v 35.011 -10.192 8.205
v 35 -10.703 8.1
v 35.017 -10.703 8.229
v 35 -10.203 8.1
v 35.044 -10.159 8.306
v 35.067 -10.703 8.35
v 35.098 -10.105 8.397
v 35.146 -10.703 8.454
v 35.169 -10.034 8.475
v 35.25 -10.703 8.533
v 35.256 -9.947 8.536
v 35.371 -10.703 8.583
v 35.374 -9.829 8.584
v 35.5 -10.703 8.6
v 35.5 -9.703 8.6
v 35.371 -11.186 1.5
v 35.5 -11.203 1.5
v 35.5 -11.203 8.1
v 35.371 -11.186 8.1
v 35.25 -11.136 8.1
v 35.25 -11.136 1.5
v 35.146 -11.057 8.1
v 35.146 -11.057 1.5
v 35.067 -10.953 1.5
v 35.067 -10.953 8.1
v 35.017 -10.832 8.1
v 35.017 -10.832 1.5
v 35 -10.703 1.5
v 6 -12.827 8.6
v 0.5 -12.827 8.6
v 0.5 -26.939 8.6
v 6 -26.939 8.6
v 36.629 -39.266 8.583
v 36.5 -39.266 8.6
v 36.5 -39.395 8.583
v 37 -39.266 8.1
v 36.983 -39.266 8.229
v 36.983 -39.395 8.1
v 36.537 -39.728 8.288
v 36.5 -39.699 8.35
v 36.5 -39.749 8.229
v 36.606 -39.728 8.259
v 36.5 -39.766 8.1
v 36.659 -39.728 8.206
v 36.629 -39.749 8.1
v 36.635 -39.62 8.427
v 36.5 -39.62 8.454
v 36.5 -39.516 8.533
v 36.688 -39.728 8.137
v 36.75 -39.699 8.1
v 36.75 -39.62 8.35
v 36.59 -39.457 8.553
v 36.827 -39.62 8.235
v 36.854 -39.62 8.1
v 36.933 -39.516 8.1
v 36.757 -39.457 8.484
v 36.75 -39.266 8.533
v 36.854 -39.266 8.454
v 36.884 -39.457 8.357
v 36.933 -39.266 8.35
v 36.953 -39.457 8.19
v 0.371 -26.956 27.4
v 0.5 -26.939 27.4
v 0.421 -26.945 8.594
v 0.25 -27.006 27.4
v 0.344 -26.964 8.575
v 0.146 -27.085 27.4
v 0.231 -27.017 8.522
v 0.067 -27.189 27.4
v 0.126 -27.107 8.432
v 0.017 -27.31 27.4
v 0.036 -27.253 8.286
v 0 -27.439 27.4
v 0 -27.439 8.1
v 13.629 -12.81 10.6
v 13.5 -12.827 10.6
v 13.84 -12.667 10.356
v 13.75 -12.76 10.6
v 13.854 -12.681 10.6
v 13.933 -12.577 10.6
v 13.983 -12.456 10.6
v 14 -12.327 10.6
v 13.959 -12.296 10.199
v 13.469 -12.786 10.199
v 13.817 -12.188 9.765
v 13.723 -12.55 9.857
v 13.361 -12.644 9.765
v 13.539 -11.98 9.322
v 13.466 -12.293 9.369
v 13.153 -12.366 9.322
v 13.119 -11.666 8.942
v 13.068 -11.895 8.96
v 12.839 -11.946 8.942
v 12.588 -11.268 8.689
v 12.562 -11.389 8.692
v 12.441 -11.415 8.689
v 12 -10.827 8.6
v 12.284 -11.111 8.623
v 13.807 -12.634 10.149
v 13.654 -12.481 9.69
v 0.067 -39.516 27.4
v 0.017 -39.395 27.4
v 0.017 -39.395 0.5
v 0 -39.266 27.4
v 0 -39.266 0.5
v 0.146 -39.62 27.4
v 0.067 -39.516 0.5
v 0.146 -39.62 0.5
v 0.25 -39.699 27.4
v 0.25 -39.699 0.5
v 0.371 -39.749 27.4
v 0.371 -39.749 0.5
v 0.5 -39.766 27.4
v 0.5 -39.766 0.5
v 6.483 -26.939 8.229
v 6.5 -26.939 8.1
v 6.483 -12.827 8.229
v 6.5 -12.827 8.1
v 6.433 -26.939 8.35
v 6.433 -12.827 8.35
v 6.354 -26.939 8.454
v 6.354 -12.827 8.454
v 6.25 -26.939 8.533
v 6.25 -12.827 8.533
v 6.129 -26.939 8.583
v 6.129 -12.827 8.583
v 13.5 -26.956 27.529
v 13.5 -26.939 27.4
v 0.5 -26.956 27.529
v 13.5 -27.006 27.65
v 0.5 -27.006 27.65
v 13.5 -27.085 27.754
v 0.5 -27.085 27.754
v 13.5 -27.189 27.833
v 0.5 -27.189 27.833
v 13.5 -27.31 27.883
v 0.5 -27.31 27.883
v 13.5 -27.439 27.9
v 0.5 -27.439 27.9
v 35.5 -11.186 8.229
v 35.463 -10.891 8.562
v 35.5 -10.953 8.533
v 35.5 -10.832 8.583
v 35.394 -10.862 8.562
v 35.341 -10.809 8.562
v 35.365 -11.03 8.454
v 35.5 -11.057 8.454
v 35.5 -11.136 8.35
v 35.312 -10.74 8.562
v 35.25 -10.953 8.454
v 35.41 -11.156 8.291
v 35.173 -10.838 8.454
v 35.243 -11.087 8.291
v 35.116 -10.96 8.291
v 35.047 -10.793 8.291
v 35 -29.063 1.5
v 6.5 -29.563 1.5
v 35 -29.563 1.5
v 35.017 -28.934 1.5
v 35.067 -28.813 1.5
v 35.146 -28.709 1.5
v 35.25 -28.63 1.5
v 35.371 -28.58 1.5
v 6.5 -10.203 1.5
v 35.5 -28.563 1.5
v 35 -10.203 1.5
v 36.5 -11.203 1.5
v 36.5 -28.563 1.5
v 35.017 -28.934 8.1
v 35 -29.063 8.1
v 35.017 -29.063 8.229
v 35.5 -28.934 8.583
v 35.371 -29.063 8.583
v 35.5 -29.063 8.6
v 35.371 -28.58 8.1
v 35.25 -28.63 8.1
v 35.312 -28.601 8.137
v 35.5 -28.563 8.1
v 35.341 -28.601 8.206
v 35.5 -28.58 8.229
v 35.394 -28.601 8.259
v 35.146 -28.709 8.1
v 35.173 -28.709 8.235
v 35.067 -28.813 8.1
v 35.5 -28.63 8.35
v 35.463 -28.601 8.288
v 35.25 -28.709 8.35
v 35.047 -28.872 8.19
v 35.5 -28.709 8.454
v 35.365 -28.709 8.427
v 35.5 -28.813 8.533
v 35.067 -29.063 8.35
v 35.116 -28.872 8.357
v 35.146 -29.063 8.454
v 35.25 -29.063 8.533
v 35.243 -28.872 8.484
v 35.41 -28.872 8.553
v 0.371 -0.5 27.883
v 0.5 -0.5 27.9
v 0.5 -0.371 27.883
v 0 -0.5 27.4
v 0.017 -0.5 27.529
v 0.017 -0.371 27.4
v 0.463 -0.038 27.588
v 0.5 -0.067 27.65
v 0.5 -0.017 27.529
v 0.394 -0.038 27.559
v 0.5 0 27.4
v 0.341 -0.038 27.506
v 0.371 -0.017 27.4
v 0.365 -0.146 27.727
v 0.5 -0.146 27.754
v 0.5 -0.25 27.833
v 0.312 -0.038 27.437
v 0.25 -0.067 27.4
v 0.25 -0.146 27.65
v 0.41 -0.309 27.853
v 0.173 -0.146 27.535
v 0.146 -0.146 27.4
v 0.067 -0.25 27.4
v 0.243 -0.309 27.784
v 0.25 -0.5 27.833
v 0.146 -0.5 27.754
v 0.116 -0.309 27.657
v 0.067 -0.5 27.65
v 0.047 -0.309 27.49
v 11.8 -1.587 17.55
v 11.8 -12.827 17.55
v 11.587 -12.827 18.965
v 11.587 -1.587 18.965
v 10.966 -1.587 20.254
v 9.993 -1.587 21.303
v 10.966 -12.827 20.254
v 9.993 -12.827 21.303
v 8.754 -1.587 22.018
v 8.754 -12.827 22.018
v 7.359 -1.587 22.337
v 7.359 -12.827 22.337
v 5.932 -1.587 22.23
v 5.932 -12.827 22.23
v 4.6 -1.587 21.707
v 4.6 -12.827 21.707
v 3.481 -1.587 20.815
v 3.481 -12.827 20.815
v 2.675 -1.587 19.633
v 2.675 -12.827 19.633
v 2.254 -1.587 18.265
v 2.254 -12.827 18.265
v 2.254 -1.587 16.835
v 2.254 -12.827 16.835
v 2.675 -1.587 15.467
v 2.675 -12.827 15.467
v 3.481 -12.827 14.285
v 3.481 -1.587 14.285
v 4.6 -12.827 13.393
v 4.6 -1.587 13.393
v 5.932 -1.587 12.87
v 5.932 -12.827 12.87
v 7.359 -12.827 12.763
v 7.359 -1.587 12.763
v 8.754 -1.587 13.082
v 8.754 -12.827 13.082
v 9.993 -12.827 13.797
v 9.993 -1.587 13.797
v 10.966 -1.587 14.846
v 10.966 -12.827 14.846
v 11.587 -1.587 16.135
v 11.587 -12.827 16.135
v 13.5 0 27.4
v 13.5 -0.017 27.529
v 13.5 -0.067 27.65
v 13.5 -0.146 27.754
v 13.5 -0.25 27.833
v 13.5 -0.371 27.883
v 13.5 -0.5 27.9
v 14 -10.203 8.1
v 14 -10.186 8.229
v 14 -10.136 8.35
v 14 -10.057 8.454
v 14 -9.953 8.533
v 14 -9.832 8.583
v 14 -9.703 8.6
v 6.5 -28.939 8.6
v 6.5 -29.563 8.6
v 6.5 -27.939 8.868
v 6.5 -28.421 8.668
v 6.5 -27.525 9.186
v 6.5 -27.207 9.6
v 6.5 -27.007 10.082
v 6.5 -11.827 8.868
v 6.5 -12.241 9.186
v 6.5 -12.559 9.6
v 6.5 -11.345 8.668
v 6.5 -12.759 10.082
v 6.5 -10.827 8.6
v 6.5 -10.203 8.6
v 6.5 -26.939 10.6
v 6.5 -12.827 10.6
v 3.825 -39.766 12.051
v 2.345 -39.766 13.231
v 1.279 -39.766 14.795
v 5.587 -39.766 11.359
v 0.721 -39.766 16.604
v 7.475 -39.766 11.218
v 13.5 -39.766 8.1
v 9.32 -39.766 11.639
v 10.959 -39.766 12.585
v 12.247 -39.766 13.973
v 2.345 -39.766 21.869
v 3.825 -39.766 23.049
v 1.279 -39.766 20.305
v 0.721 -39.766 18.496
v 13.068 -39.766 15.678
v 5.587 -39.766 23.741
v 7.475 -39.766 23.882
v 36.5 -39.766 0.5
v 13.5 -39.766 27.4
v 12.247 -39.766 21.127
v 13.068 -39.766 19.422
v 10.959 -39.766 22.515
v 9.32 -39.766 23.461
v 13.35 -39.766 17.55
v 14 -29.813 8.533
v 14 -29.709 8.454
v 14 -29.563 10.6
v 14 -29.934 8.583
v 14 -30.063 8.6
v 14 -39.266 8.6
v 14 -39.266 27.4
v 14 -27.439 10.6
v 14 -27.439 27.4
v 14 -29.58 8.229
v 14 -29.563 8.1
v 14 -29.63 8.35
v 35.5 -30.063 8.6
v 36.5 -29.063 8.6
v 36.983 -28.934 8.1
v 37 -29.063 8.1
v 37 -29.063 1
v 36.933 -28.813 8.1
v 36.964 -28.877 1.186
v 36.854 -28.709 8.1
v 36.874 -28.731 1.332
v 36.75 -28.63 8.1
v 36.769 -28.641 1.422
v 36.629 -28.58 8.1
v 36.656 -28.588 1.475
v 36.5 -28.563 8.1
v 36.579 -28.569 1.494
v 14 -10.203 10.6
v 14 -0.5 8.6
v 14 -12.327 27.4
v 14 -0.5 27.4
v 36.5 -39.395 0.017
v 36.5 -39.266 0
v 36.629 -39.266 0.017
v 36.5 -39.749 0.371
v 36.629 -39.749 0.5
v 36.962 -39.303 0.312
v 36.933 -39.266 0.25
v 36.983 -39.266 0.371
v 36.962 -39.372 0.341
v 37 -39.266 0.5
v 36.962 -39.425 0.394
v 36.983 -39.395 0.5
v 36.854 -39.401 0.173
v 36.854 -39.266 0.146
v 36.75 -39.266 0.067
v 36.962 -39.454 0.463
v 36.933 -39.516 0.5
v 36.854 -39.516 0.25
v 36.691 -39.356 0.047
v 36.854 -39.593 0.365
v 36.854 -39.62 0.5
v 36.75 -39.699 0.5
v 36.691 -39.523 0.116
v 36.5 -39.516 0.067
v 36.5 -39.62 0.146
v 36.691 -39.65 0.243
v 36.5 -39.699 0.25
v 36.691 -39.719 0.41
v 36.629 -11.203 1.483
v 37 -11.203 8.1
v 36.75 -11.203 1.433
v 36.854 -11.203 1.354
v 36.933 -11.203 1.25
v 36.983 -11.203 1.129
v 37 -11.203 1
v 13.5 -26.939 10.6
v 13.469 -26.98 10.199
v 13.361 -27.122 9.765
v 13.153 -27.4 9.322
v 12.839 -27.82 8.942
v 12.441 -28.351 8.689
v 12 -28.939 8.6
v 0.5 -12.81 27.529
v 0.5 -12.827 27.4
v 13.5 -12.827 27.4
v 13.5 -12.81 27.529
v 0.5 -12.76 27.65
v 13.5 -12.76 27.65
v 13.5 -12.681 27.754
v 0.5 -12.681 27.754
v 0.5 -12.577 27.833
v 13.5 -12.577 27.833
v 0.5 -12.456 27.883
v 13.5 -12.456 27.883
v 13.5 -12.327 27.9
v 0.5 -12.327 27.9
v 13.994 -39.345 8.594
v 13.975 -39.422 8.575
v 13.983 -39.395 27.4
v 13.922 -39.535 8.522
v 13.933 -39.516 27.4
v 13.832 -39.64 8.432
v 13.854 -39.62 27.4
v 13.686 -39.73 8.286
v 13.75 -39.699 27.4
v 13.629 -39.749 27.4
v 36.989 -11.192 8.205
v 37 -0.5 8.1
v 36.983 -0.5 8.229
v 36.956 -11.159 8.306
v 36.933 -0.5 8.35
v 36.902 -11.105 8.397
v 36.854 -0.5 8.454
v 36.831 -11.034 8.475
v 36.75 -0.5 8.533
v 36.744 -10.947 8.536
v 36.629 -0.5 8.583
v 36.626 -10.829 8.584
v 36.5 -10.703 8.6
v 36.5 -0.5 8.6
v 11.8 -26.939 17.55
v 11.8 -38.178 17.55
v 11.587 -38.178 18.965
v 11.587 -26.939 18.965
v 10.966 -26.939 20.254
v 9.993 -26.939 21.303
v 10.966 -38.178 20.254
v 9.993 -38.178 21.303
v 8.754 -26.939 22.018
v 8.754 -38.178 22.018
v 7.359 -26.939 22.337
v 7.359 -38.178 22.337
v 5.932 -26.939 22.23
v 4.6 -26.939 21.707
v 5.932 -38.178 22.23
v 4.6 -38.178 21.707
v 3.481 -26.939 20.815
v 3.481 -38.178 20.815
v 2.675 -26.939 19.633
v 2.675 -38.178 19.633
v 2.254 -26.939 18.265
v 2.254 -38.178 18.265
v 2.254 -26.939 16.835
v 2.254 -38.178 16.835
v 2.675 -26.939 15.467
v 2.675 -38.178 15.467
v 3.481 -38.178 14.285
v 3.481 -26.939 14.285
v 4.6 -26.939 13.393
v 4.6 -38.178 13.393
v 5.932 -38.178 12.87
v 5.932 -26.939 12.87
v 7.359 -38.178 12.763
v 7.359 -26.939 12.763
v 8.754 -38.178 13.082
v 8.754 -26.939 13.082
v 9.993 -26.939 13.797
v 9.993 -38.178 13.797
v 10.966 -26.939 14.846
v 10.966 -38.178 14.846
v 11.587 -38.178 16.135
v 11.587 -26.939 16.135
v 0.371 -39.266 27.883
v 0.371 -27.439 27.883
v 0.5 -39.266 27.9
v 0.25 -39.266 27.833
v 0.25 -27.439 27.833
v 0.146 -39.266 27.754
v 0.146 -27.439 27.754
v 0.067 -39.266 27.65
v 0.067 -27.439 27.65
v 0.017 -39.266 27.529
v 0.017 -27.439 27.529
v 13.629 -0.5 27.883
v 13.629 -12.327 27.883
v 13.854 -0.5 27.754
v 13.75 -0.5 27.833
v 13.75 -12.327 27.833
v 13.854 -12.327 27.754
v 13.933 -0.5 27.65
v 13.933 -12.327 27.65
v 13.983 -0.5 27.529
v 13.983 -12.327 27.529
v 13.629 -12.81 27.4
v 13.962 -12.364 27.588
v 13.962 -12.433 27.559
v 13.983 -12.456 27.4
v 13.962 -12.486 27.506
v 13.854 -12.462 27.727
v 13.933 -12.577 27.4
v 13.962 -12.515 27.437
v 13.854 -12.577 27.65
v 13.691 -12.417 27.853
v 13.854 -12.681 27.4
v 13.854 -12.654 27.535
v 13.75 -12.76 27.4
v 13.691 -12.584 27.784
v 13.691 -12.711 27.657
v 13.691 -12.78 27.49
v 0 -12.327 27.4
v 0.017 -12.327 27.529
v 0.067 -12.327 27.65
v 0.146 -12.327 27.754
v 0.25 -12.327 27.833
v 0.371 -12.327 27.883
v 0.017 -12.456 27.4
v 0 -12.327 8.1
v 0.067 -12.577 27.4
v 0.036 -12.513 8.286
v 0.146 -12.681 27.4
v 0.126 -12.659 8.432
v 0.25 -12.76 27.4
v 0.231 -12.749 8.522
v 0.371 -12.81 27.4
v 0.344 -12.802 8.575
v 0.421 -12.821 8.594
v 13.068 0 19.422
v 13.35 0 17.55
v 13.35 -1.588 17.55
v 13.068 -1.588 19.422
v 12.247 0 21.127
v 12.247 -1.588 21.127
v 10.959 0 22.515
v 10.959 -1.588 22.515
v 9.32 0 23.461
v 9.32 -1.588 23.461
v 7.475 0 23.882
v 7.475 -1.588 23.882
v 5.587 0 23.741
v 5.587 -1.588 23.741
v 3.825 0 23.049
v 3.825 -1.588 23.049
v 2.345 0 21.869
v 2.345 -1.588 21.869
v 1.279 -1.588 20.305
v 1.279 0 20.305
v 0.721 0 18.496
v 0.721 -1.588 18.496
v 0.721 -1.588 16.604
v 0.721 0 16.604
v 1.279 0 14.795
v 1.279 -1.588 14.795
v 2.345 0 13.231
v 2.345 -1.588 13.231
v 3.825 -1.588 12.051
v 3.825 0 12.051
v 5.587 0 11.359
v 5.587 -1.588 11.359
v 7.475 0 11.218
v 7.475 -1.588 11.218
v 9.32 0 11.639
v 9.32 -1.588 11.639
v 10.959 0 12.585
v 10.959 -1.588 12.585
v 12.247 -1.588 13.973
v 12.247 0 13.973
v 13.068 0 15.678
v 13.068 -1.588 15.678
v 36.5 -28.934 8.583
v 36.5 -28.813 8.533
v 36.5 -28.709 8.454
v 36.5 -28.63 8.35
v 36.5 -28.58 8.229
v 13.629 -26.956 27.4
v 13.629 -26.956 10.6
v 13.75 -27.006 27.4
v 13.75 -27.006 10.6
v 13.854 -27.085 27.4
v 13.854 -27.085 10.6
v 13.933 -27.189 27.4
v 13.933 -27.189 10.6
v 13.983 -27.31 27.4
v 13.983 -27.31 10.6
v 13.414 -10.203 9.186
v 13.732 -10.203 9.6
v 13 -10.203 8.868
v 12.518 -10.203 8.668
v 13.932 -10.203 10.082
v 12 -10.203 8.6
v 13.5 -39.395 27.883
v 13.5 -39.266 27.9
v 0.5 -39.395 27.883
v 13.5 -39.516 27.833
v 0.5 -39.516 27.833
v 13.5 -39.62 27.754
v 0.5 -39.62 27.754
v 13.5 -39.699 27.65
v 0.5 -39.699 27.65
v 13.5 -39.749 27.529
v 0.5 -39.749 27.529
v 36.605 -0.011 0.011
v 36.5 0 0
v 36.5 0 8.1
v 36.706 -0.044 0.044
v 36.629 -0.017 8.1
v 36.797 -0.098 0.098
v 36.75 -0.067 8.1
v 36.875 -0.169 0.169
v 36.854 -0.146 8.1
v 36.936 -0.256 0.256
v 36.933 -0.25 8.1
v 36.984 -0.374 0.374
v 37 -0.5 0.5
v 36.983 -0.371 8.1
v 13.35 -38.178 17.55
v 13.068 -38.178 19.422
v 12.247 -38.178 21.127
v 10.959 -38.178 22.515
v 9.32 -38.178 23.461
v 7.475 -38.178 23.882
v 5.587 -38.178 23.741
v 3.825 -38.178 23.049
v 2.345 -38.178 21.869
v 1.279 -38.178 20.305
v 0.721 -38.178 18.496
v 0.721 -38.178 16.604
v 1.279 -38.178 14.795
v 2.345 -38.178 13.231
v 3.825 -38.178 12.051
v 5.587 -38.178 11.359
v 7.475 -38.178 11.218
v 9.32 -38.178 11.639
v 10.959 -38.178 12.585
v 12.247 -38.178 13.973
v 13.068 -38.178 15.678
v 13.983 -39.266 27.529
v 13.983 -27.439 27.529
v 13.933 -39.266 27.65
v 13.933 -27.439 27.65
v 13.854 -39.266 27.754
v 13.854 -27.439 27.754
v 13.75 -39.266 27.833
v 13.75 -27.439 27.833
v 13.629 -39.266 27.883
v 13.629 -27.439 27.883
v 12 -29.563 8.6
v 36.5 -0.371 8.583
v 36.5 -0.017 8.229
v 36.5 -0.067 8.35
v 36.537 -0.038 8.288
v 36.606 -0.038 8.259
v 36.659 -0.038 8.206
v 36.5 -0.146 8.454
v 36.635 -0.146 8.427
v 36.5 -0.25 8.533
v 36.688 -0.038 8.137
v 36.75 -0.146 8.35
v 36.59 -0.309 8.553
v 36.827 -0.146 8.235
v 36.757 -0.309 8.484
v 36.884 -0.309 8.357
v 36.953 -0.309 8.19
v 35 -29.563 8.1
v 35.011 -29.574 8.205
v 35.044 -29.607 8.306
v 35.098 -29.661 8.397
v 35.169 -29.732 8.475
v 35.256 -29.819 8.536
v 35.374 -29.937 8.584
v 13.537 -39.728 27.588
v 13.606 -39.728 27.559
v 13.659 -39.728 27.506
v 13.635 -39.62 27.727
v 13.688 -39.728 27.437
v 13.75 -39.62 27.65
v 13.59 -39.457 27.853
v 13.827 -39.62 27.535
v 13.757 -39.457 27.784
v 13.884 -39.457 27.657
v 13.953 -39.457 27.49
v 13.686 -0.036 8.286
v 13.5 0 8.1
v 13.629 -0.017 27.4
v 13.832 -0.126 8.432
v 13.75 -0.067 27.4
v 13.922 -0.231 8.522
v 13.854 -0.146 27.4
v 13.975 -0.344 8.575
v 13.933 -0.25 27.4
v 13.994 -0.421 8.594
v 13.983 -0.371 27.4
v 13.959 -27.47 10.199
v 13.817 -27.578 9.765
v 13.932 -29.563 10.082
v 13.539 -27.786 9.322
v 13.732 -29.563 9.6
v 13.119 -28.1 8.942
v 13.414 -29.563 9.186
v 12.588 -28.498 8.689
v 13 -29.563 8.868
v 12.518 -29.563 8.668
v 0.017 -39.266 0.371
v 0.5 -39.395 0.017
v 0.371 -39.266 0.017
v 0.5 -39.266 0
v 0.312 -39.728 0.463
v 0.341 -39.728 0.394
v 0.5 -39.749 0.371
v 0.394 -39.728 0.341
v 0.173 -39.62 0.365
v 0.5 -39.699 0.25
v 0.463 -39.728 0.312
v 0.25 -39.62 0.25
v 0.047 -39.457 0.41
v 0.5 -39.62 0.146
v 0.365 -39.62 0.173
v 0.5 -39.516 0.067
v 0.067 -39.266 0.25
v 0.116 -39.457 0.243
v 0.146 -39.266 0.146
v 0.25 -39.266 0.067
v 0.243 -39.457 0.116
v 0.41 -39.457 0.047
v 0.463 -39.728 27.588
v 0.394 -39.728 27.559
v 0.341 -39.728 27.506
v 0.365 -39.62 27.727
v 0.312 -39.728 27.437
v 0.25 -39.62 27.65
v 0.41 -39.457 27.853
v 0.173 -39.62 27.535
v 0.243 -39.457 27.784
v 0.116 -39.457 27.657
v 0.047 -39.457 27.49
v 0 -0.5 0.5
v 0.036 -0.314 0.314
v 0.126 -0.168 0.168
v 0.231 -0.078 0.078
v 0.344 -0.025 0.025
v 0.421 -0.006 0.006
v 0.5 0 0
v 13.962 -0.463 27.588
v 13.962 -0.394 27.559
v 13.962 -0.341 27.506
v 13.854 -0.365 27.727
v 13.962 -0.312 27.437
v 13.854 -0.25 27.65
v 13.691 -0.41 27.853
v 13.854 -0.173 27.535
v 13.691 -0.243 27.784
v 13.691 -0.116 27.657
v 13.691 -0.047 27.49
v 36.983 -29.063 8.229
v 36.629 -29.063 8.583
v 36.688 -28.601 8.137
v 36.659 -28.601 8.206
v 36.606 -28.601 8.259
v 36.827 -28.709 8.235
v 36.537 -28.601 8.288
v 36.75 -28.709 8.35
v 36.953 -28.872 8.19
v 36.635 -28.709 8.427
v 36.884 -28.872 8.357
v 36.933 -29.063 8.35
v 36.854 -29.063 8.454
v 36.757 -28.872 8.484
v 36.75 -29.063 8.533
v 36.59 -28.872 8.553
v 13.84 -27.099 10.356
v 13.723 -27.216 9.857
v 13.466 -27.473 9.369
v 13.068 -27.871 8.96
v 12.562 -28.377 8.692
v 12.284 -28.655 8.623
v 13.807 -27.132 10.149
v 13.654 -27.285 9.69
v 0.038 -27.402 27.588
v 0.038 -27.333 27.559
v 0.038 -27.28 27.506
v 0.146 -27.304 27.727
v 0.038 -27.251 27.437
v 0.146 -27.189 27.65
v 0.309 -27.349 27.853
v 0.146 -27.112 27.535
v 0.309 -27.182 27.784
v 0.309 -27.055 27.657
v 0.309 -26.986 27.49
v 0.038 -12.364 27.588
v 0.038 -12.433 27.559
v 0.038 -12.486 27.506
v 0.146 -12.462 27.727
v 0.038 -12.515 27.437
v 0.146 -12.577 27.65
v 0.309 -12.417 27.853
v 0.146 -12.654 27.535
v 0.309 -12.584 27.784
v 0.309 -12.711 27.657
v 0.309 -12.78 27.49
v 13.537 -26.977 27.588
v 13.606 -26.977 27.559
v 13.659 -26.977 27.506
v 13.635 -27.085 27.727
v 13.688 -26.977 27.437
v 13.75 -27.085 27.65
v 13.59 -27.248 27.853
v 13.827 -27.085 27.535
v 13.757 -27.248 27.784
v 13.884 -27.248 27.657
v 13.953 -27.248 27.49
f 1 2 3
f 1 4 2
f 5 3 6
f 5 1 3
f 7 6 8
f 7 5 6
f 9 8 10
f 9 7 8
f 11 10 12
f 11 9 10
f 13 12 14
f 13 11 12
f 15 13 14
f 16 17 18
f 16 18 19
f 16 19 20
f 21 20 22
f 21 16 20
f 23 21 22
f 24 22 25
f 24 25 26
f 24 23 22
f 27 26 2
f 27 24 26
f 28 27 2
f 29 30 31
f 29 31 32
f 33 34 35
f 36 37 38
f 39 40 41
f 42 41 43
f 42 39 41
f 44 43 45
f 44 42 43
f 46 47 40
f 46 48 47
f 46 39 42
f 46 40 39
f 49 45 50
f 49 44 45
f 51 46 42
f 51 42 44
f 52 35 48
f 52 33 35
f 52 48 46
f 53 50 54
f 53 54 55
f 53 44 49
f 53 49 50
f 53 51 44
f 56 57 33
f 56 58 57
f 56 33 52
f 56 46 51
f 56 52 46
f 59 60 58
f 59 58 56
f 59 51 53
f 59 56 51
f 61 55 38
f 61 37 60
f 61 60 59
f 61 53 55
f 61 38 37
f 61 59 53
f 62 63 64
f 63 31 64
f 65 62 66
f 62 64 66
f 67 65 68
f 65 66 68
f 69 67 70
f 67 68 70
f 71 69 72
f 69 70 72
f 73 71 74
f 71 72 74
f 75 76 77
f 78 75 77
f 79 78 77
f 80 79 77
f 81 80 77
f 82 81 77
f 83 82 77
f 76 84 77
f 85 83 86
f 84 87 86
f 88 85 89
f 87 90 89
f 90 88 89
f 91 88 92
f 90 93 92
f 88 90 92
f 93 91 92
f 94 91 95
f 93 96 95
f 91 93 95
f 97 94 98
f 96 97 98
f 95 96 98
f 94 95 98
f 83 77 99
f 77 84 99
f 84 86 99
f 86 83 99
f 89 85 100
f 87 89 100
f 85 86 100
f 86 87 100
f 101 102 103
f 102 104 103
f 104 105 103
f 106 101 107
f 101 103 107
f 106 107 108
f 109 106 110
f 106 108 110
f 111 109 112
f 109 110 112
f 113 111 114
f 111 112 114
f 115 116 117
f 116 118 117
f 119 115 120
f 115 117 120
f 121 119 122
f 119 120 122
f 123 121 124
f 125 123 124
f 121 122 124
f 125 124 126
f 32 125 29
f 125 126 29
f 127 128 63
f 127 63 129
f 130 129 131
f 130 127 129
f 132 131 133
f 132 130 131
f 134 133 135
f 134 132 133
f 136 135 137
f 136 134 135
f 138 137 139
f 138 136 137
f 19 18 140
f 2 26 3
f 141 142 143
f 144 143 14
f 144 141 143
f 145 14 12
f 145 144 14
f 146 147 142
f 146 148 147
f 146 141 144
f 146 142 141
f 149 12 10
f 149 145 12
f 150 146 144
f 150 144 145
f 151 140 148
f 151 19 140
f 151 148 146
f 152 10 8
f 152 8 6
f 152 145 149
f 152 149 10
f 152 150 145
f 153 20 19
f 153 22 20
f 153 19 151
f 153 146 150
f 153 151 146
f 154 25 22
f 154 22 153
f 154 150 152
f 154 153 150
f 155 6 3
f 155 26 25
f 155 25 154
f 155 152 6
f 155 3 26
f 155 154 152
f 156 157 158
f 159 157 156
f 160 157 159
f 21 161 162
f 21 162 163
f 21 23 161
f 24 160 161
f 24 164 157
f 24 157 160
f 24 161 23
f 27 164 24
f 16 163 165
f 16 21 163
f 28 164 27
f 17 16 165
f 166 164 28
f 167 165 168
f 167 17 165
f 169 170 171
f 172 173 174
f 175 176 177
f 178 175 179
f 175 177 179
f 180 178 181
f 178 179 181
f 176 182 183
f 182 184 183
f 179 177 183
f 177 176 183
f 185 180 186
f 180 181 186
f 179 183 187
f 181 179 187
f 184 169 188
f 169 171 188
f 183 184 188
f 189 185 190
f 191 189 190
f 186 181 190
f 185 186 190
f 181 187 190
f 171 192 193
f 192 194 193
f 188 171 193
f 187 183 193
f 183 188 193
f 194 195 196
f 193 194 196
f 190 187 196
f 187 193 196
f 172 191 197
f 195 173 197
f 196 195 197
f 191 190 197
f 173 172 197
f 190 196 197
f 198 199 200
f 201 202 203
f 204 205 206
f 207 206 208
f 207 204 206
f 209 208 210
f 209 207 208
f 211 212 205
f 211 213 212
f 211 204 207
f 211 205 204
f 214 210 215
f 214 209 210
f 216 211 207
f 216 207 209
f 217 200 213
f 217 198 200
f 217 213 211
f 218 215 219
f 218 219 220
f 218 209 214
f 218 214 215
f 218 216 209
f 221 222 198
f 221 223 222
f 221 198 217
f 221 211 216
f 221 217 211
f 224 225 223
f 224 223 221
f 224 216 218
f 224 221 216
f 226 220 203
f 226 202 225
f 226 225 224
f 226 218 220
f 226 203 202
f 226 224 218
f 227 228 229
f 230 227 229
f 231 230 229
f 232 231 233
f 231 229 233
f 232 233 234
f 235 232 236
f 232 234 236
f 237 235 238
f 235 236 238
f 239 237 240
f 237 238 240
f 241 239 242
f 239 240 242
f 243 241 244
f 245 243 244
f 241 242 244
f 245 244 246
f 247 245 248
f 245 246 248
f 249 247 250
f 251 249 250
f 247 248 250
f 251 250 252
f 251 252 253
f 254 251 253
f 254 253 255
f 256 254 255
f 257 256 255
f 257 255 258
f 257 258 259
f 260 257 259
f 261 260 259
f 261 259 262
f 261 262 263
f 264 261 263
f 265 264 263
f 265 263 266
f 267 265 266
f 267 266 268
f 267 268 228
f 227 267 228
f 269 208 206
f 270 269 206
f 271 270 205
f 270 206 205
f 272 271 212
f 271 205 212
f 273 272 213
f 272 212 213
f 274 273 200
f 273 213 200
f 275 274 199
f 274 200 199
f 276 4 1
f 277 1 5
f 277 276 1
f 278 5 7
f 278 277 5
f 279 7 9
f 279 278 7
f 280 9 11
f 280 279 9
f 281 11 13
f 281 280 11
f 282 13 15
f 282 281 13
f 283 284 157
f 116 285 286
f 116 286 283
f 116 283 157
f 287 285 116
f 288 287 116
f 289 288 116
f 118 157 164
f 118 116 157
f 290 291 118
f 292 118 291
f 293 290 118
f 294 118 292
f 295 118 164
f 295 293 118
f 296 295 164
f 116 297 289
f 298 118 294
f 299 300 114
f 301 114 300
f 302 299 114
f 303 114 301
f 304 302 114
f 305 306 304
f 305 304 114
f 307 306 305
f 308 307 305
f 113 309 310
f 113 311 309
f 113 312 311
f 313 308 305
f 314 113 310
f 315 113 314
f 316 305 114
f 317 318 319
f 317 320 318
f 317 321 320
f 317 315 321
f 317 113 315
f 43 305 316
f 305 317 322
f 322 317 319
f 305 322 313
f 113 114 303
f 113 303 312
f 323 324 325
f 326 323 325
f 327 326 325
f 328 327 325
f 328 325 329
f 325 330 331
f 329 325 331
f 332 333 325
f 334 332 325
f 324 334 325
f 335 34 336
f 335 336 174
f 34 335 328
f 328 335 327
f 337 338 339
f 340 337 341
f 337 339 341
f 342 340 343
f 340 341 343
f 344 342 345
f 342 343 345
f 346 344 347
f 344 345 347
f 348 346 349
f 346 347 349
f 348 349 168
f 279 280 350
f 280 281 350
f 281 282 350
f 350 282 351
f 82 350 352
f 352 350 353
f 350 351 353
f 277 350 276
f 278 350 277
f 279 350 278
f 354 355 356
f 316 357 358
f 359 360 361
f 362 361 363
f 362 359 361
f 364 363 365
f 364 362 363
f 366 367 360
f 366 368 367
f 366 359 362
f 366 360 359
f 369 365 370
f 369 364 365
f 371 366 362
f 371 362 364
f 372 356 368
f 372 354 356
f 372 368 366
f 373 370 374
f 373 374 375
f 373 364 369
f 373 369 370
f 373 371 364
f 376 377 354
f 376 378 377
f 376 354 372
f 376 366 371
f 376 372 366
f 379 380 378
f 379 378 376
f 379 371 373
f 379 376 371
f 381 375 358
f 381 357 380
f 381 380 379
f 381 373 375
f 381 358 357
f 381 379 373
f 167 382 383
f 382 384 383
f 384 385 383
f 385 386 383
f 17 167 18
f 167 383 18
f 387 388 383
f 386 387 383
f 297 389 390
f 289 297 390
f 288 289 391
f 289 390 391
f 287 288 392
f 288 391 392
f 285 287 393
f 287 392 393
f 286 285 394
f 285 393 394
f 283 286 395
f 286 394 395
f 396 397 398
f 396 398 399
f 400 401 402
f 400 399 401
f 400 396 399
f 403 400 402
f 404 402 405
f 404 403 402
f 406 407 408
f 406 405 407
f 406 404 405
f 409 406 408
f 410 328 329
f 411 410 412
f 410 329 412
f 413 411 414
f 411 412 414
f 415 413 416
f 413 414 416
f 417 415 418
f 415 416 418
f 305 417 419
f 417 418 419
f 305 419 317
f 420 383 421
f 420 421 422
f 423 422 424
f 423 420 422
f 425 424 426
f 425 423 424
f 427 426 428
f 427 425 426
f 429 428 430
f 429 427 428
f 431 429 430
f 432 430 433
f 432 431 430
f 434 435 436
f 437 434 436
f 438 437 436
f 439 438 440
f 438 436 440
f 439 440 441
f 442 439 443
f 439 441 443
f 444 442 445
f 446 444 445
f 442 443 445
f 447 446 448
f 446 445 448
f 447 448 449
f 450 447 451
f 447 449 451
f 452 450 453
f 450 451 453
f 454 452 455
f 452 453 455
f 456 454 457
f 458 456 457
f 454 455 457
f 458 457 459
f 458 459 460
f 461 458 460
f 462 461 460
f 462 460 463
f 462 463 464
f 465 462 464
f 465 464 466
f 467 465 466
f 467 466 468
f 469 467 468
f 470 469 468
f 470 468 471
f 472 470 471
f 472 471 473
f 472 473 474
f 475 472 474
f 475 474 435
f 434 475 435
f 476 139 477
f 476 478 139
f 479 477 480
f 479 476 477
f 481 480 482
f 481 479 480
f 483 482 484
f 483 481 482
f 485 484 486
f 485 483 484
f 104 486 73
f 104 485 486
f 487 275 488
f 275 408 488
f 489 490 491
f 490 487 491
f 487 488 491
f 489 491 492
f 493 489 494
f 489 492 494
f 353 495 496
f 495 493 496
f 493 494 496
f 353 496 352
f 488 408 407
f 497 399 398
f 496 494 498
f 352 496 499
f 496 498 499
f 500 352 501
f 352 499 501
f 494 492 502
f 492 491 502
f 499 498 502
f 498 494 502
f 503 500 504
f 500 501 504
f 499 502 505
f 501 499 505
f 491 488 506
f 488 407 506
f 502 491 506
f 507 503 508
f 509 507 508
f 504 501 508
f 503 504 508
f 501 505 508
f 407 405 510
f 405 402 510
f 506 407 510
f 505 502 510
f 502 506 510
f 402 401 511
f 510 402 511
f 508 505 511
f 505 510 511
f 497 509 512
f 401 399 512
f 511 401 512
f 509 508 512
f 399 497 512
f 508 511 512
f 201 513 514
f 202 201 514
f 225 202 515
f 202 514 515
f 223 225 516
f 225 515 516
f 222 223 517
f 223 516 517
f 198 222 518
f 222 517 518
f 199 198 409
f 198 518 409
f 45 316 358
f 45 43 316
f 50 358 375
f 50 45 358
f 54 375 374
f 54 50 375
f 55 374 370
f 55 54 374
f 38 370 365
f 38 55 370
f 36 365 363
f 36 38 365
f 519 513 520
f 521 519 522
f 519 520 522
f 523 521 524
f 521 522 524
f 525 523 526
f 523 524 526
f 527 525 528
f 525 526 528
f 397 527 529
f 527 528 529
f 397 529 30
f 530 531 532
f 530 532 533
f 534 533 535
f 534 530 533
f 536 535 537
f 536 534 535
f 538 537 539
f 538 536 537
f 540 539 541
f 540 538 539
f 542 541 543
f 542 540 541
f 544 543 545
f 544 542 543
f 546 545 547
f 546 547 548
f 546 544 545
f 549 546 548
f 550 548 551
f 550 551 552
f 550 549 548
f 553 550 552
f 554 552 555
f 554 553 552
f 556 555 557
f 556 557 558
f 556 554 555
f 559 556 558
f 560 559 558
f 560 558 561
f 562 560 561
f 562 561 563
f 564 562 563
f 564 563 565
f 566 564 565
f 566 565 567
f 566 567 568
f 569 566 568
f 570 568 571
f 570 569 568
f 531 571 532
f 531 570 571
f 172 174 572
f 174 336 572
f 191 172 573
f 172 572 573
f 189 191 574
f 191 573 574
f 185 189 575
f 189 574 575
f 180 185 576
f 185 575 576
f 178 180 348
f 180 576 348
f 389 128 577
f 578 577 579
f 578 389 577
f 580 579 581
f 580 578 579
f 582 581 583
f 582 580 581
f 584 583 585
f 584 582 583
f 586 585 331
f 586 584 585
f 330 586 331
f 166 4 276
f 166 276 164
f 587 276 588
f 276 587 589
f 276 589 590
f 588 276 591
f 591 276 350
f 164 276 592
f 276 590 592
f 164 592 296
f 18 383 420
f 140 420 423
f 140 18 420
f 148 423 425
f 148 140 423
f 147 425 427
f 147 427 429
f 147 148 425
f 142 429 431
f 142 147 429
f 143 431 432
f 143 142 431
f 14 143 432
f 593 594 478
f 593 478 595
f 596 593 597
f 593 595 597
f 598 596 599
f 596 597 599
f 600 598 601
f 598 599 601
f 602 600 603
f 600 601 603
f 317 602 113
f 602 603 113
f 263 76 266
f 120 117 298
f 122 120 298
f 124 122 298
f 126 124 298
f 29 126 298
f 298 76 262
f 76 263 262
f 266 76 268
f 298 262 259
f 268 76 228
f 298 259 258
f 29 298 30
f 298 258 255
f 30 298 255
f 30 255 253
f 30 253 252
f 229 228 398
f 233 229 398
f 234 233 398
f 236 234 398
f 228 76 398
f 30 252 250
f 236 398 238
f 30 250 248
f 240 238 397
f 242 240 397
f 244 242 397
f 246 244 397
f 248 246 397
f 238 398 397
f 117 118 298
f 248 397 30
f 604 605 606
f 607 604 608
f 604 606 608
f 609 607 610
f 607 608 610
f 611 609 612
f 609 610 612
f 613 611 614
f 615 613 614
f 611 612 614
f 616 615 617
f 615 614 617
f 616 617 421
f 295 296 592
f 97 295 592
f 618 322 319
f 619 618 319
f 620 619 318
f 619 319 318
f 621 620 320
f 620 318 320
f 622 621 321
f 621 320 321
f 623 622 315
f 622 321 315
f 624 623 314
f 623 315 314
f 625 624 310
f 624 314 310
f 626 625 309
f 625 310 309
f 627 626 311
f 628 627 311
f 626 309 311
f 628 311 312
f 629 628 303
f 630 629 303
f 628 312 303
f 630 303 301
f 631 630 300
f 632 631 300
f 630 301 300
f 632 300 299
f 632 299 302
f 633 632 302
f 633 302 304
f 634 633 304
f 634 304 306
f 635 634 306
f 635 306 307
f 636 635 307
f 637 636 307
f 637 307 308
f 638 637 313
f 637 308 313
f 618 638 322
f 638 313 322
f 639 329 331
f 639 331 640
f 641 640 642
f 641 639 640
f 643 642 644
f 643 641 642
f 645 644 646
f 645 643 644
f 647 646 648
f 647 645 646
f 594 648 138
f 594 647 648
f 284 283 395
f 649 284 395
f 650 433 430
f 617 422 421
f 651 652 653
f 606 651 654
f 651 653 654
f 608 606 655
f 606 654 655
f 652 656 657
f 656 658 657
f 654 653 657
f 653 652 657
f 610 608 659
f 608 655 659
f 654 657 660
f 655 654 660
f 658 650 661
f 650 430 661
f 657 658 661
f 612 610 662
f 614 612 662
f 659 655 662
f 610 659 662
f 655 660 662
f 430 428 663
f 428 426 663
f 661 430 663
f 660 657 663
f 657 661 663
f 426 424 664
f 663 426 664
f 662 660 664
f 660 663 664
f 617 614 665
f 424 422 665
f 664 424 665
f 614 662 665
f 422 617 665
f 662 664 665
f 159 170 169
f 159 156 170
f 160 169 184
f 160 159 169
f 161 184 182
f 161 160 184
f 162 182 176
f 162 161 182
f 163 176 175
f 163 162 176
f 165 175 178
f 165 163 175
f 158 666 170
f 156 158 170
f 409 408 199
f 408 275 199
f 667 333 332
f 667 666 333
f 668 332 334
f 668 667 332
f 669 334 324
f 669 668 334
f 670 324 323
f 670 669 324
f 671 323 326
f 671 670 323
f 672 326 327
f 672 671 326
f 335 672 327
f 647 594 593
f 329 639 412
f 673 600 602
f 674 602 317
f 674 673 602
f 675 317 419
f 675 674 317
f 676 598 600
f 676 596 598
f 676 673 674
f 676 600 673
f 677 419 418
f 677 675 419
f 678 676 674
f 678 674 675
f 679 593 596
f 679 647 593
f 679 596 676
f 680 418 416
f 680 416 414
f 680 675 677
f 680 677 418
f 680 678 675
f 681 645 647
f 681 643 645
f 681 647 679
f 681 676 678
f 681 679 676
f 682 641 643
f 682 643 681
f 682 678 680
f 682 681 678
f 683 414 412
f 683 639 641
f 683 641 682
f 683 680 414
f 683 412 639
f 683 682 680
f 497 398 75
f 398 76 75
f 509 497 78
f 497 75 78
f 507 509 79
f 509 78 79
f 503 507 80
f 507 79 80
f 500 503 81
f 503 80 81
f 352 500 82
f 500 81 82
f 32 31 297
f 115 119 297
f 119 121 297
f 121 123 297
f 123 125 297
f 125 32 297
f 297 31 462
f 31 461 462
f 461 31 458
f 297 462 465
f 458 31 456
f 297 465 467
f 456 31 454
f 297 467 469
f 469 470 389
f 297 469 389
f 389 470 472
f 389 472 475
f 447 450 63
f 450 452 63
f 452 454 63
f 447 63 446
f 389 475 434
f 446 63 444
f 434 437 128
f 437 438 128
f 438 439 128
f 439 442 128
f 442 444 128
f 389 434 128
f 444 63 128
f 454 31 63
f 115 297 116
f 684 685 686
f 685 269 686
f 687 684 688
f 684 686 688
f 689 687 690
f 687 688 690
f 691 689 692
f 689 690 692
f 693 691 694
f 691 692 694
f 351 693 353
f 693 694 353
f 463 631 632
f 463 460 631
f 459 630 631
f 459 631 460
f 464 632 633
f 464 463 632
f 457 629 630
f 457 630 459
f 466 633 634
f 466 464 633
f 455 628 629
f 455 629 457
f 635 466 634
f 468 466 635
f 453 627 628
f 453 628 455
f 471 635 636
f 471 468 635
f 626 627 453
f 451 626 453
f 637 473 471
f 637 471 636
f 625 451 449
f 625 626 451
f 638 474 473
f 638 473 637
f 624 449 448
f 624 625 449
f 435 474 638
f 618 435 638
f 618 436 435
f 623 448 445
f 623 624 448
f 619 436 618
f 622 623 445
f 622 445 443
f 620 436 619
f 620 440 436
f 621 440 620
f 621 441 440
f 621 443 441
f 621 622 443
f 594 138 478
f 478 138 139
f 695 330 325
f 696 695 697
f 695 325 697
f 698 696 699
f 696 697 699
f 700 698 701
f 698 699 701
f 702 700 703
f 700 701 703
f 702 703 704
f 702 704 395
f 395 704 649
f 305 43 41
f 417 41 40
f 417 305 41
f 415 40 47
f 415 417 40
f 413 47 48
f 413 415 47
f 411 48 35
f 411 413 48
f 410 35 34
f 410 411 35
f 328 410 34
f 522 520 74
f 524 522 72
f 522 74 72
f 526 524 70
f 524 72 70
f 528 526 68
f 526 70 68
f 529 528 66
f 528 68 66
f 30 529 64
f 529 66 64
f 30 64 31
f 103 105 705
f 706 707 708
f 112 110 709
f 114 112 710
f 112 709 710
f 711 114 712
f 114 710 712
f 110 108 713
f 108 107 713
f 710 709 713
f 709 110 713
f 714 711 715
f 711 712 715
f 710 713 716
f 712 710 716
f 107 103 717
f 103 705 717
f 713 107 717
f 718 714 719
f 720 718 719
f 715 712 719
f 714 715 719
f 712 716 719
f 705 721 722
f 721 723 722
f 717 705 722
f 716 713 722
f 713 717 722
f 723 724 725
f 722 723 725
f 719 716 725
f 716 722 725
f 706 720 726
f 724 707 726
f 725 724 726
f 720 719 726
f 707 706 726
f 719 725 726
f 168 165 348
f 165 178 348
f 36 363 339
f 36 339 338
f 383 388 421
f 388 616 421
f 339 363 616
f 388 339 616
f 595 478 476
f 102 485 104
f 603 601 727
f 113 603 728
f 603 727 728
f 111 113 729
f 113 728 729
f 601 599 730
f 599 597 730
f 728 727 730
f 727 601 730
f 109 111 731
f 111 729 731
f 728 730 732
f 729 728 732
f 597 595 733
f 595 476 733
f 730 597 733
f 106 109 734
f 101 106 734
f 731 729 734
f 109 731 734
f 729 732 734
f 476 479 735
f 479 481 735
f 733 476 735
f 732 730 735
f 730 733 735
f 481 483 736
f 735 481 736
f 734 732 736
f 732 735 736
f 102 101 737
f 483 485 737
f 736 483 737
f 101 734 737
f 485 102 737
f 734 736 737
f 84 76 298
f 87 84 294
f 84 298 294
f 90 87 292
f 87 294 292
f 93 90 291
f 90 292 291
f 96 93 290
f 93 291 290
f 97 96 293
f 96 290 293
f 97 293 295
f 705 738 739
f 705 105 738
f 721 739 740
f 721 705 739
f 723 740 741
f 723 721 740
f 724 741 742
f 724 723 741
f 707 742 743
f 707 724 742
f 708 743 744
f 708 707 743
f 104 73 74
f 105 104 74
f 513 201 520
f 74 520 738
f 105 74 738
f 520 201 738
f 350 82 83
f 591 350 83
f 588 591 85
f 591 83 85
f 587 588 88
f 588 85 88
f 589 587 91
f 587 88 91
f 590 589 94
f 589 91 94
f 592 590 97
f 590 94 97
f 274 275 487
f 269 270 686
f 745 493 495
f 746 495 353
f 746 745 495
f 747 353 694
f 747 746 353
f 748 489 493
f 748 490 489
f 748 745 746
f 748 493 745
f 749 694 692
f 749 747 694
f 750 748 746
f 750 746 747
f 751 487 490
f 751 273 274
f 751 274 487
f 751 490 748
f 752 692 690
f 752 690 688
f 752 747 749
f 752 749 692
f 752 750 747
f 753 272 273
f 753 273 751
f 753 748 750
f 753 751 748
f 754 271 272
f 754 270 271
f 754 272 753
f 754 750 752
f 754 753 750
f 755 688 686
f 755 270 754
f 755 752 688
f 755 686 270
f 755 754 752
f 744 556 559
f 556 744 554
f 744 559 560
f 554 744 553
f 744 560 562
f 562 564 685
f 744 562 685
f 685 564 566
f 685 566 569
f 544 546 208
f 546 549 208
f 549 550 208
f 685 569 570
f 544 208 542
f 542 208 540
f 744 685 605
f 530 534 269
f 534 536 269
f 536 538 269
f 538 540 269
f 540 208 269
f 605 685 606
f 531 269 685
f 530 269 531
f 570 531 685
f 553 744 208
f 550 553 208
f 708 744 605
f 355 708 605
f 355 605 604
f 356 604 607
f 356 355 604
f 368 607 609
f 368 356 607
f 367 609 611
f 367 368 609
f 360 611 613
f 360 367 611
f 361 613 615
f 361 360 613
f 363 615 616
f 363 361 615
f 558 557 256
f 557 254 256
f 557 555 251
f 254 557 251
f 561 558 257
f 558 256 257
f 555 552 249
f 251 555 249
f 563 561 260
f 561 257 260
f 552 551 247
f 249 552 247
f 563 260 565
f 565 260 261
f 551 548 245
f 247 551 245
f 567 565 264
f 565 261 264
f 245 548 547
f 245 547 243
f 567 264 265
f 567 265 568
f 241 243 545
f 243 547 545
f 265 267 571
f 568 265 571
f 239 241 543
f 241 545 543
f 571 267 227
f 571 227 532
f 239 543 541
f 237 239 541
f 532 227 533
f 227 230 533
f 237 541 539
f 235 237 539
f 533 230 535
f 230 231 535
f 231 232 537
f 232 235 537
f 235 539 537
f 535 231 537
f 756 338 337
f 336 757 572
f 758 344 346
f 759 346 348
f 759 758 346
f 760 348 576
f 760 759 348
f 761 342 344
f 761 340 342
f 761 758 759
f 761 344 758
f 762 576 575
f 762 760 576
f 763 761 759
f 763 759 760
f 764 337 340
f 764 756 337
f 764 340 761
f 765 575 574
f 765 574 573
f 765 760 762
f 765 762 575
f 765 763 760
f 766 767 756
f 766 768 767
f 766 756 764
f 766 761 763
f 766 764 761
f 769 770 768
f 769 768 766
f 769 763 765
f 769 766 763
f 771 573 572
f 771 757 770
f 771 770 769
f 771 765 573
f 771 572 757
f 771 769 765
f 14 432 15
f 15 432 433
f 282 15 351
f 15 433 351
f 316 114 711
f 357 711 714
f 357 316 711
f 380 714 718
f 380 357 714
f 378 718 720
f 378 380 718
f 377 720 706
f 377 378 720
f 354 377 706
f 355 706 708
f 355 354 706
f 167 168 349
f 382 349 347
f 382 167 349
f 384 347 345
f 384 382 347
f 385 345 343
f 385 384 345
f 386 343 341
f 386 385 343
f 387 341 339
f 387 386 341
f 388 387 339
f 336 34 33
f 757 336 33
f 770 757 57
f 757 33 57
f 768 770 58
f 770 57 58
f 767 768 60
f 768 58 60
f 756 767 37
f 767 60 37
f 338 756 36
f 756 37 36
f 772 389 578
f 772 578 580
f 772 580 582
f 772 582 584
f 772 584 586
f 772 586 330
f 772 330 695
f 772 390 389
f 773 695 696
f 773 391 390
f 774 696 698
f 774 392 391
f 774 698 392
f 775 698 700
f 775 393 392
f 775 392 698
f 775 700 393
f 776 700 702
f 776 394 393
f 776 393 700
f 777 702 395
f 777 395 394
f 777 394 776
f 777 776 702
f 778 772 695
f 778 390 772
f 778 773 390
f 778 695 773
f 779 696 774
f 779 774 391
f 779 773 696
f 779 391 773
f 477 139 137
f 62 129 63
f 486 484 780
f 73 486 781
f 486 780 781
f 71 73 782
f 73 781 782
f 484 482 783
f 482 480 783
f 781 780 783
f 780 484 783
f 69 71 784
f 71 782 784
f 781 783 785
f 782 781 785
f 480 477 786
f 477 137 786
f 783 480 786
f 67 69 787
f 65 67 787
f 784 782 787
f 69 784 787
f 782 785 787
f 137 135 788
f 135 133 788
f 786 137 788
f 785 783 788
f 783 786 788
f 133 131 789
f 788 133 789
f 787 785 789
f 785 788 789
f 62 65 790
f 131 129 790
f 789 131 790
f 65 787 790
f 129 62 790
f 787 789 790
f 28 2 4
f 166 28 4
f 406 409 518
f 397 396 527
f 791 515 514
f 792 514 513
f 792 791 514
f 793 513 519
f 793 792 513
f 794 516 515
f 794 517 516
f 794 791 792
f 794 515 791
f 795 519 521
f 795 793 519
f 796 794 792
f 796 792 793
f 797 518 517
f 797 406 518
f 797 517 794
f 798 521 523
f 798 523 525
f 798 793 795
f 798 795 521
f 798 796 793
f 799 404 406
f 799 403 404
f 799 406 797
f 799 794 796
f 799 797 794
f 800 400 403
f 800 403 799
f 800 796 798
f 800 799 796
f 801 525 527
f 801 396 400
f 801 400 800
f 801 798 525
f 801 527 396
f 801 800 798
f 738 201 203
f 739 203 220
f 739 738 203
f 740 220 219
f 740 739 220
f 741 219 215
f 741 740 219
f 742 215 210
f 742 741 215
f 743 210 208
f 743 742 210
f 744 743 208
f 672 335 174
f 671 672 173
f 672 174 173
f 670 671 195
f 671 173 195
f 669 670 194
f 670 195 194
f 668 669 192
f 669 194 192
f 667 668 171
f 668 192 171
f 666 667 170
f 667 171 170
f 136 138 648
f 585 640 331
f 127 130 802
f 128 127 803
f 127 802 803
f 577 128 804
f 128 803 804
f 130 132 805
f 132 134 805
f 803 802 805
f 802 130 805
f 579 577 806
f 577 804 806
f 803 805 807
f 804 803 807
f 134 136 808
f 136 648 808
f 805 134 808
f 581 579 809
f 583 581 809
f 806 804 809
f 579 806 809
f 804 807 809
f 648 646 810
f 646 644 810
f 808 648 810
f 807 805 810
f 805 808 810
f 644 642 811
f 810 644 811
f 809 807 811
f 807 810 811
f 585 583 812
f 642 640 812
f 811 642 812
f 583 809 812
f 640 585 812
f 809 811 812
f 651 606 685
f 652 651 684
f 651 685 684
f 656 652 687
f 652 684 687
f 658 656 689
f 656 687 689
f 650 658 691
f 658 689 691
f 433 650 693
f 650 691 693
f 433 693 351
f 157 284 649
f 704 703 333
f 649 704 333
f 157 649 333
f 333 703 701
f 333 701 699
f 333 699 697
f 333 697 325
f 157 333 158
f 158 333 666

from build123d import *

# Parameters (mm, degrees)
F1_DEPTH  = 39.766
F2_R      = 4.8
F3_DEPTH  = 39.767
F2_R_2    = 6.35
F4_DEPTH  = 1.5875
F5_R      = 6.35
F6_DEPTH  = 1.5875
F7_W      = 7.5
F7_H      = 19.36
F8_DEPTH  = 7.1
F10_DEPTH = 19.3
F11_R     = 2
F12_R     = 0.5


with BuildPart() as f1:
    # F0 (on Front) → F1 (new body)
    with BuildSketch(Plane.XZ):
        Polygon((0, 27.9), (0, 0), (37, 0), (37, 8.6), (14, 8.6), (14, 27.9), align=None)
    extrude(amount=F1_DEPTH)

    # F2 (on face) → F3 (cut, through all)
    with BuildSketch(Plane.XZ.offset(39.766)):
        with Locations((7, 17.55)):
            Circle(F2_R)
    extrude(amount=-F3_DEPTH, mode=Mode.SUBTRACT)

    # F2 (on face) → F4 (cut)
    with BuildSketch(Plane.XZ.offset(39.766)):
        with Locations((7, 17.55)):
            Circle(F2_R_2)
        with Locations((7, 17.55)):
            Circle(F2_R, mode=Mode.SUBTRACT)
    extrude(amount=-F4_DEPTH, mode=Mode.SUBTRACT)

    # F5 (on face) → F6 (cut)
    with BuildSketch(Plane.XZ):
        with Locations((7, 17.55)):
            Circle(F5_R)
    extrude(amount=F6_DEPTH, mode=Mode.SUBTRACT)

    # F7 (on face) → F8 (cut)
    with BuildSketch(Plane.XY.offset(8.6)):
        with Locations((10.25, -19.883)):
            Rectangle(F7_W, F7_H)
        Polygon((37, -28.563), (37, -11.203), (35, -11.203), (35, -10.203), (14, -10.203), (14, -29.563), (35, -29.563), (35, -28.563), align=None)
    extrude(amount=-F8_DEPTH, mode=Mode.SUBTRACT)

    # F9 (on face) → F10 (cut, through all)
    with BuildSketch(Plane.XY.offset(27.9)):
        Polygon((0, -12.827), (0, -19.883), (0, -26.939), (14, -26.939), (14, -12.827), align=None)
    extrude(amount=-F10_DEPTH, mode=Mode.SUBTRACT)

    # F11
    f11_edges = [f1.edges().sort_by_distance(p)[0] for p in [
        (10.25, -26.939, 8.6),
        (14, -11.515, 8.6),
        (10.25, -12.827, 8.6),
        (14, -28.251, 8.6),
    ]]
    fillet(f11_edges, radius=F11_R)

    # F12
    f12_edges = [f1.edges().sort_by_distance(p)[0] for p in [
        (24.5, -10.203, 8.6),
        (24.5, -29.563, 8.6),
        (6.5, -19.883, 8.6),
        (37, -5.6015, 8.6),
        (37, -34.1645, 8.6),
        (37, -28.563, 5.05),
        (35, -11.203, 5.05),
        (37, -19.883, 1.5),
        (35, -29.063, 8.6),
        (35, -28.563, 5.05),
        (36, -28.563, 8.6),
        (36, -11.203, 8.6),
        (35, -10.703, 8.6),
        (25.5, 0, 8.6),
        (25.5, -39.766, 8.6),
        (14, -33.3525, 27.9),
        (7, -26.939, 27.9),
        (0, -33.3525, 27.9),
        (7, -39.766, 27.9),
        (7, -12.827, 27.9),
        (0, -19.883, 8.6),
        (0, -6.4135, 27.9),
        (7, 0, 27.9),
        (14, -6.4135, 27.9),
        (14, -12.827, 19.25),
        (0, -12.827, 18.25),
        (0, 0, 13.95),
        (0, -19.883, 0),
        (0, -39.766, 13.95),
        (14, -39.766, 18.25),
        (14, -26.939, 19.25),
        (14, 0, 18.25),
        (18.5, -39.766, 0),
        (37, -19.883, 0),
        (37, -39.766, 4.3),
        (37, 0, 4.3),
        (0, -26.939, 18.25),
        (13.414214, -12.241214, 9.185786),
        (13.414214, -27.524786, 9.185786),
    ]]
    fillet(f12_edges, radius=F12_R)


solid = f1.part
